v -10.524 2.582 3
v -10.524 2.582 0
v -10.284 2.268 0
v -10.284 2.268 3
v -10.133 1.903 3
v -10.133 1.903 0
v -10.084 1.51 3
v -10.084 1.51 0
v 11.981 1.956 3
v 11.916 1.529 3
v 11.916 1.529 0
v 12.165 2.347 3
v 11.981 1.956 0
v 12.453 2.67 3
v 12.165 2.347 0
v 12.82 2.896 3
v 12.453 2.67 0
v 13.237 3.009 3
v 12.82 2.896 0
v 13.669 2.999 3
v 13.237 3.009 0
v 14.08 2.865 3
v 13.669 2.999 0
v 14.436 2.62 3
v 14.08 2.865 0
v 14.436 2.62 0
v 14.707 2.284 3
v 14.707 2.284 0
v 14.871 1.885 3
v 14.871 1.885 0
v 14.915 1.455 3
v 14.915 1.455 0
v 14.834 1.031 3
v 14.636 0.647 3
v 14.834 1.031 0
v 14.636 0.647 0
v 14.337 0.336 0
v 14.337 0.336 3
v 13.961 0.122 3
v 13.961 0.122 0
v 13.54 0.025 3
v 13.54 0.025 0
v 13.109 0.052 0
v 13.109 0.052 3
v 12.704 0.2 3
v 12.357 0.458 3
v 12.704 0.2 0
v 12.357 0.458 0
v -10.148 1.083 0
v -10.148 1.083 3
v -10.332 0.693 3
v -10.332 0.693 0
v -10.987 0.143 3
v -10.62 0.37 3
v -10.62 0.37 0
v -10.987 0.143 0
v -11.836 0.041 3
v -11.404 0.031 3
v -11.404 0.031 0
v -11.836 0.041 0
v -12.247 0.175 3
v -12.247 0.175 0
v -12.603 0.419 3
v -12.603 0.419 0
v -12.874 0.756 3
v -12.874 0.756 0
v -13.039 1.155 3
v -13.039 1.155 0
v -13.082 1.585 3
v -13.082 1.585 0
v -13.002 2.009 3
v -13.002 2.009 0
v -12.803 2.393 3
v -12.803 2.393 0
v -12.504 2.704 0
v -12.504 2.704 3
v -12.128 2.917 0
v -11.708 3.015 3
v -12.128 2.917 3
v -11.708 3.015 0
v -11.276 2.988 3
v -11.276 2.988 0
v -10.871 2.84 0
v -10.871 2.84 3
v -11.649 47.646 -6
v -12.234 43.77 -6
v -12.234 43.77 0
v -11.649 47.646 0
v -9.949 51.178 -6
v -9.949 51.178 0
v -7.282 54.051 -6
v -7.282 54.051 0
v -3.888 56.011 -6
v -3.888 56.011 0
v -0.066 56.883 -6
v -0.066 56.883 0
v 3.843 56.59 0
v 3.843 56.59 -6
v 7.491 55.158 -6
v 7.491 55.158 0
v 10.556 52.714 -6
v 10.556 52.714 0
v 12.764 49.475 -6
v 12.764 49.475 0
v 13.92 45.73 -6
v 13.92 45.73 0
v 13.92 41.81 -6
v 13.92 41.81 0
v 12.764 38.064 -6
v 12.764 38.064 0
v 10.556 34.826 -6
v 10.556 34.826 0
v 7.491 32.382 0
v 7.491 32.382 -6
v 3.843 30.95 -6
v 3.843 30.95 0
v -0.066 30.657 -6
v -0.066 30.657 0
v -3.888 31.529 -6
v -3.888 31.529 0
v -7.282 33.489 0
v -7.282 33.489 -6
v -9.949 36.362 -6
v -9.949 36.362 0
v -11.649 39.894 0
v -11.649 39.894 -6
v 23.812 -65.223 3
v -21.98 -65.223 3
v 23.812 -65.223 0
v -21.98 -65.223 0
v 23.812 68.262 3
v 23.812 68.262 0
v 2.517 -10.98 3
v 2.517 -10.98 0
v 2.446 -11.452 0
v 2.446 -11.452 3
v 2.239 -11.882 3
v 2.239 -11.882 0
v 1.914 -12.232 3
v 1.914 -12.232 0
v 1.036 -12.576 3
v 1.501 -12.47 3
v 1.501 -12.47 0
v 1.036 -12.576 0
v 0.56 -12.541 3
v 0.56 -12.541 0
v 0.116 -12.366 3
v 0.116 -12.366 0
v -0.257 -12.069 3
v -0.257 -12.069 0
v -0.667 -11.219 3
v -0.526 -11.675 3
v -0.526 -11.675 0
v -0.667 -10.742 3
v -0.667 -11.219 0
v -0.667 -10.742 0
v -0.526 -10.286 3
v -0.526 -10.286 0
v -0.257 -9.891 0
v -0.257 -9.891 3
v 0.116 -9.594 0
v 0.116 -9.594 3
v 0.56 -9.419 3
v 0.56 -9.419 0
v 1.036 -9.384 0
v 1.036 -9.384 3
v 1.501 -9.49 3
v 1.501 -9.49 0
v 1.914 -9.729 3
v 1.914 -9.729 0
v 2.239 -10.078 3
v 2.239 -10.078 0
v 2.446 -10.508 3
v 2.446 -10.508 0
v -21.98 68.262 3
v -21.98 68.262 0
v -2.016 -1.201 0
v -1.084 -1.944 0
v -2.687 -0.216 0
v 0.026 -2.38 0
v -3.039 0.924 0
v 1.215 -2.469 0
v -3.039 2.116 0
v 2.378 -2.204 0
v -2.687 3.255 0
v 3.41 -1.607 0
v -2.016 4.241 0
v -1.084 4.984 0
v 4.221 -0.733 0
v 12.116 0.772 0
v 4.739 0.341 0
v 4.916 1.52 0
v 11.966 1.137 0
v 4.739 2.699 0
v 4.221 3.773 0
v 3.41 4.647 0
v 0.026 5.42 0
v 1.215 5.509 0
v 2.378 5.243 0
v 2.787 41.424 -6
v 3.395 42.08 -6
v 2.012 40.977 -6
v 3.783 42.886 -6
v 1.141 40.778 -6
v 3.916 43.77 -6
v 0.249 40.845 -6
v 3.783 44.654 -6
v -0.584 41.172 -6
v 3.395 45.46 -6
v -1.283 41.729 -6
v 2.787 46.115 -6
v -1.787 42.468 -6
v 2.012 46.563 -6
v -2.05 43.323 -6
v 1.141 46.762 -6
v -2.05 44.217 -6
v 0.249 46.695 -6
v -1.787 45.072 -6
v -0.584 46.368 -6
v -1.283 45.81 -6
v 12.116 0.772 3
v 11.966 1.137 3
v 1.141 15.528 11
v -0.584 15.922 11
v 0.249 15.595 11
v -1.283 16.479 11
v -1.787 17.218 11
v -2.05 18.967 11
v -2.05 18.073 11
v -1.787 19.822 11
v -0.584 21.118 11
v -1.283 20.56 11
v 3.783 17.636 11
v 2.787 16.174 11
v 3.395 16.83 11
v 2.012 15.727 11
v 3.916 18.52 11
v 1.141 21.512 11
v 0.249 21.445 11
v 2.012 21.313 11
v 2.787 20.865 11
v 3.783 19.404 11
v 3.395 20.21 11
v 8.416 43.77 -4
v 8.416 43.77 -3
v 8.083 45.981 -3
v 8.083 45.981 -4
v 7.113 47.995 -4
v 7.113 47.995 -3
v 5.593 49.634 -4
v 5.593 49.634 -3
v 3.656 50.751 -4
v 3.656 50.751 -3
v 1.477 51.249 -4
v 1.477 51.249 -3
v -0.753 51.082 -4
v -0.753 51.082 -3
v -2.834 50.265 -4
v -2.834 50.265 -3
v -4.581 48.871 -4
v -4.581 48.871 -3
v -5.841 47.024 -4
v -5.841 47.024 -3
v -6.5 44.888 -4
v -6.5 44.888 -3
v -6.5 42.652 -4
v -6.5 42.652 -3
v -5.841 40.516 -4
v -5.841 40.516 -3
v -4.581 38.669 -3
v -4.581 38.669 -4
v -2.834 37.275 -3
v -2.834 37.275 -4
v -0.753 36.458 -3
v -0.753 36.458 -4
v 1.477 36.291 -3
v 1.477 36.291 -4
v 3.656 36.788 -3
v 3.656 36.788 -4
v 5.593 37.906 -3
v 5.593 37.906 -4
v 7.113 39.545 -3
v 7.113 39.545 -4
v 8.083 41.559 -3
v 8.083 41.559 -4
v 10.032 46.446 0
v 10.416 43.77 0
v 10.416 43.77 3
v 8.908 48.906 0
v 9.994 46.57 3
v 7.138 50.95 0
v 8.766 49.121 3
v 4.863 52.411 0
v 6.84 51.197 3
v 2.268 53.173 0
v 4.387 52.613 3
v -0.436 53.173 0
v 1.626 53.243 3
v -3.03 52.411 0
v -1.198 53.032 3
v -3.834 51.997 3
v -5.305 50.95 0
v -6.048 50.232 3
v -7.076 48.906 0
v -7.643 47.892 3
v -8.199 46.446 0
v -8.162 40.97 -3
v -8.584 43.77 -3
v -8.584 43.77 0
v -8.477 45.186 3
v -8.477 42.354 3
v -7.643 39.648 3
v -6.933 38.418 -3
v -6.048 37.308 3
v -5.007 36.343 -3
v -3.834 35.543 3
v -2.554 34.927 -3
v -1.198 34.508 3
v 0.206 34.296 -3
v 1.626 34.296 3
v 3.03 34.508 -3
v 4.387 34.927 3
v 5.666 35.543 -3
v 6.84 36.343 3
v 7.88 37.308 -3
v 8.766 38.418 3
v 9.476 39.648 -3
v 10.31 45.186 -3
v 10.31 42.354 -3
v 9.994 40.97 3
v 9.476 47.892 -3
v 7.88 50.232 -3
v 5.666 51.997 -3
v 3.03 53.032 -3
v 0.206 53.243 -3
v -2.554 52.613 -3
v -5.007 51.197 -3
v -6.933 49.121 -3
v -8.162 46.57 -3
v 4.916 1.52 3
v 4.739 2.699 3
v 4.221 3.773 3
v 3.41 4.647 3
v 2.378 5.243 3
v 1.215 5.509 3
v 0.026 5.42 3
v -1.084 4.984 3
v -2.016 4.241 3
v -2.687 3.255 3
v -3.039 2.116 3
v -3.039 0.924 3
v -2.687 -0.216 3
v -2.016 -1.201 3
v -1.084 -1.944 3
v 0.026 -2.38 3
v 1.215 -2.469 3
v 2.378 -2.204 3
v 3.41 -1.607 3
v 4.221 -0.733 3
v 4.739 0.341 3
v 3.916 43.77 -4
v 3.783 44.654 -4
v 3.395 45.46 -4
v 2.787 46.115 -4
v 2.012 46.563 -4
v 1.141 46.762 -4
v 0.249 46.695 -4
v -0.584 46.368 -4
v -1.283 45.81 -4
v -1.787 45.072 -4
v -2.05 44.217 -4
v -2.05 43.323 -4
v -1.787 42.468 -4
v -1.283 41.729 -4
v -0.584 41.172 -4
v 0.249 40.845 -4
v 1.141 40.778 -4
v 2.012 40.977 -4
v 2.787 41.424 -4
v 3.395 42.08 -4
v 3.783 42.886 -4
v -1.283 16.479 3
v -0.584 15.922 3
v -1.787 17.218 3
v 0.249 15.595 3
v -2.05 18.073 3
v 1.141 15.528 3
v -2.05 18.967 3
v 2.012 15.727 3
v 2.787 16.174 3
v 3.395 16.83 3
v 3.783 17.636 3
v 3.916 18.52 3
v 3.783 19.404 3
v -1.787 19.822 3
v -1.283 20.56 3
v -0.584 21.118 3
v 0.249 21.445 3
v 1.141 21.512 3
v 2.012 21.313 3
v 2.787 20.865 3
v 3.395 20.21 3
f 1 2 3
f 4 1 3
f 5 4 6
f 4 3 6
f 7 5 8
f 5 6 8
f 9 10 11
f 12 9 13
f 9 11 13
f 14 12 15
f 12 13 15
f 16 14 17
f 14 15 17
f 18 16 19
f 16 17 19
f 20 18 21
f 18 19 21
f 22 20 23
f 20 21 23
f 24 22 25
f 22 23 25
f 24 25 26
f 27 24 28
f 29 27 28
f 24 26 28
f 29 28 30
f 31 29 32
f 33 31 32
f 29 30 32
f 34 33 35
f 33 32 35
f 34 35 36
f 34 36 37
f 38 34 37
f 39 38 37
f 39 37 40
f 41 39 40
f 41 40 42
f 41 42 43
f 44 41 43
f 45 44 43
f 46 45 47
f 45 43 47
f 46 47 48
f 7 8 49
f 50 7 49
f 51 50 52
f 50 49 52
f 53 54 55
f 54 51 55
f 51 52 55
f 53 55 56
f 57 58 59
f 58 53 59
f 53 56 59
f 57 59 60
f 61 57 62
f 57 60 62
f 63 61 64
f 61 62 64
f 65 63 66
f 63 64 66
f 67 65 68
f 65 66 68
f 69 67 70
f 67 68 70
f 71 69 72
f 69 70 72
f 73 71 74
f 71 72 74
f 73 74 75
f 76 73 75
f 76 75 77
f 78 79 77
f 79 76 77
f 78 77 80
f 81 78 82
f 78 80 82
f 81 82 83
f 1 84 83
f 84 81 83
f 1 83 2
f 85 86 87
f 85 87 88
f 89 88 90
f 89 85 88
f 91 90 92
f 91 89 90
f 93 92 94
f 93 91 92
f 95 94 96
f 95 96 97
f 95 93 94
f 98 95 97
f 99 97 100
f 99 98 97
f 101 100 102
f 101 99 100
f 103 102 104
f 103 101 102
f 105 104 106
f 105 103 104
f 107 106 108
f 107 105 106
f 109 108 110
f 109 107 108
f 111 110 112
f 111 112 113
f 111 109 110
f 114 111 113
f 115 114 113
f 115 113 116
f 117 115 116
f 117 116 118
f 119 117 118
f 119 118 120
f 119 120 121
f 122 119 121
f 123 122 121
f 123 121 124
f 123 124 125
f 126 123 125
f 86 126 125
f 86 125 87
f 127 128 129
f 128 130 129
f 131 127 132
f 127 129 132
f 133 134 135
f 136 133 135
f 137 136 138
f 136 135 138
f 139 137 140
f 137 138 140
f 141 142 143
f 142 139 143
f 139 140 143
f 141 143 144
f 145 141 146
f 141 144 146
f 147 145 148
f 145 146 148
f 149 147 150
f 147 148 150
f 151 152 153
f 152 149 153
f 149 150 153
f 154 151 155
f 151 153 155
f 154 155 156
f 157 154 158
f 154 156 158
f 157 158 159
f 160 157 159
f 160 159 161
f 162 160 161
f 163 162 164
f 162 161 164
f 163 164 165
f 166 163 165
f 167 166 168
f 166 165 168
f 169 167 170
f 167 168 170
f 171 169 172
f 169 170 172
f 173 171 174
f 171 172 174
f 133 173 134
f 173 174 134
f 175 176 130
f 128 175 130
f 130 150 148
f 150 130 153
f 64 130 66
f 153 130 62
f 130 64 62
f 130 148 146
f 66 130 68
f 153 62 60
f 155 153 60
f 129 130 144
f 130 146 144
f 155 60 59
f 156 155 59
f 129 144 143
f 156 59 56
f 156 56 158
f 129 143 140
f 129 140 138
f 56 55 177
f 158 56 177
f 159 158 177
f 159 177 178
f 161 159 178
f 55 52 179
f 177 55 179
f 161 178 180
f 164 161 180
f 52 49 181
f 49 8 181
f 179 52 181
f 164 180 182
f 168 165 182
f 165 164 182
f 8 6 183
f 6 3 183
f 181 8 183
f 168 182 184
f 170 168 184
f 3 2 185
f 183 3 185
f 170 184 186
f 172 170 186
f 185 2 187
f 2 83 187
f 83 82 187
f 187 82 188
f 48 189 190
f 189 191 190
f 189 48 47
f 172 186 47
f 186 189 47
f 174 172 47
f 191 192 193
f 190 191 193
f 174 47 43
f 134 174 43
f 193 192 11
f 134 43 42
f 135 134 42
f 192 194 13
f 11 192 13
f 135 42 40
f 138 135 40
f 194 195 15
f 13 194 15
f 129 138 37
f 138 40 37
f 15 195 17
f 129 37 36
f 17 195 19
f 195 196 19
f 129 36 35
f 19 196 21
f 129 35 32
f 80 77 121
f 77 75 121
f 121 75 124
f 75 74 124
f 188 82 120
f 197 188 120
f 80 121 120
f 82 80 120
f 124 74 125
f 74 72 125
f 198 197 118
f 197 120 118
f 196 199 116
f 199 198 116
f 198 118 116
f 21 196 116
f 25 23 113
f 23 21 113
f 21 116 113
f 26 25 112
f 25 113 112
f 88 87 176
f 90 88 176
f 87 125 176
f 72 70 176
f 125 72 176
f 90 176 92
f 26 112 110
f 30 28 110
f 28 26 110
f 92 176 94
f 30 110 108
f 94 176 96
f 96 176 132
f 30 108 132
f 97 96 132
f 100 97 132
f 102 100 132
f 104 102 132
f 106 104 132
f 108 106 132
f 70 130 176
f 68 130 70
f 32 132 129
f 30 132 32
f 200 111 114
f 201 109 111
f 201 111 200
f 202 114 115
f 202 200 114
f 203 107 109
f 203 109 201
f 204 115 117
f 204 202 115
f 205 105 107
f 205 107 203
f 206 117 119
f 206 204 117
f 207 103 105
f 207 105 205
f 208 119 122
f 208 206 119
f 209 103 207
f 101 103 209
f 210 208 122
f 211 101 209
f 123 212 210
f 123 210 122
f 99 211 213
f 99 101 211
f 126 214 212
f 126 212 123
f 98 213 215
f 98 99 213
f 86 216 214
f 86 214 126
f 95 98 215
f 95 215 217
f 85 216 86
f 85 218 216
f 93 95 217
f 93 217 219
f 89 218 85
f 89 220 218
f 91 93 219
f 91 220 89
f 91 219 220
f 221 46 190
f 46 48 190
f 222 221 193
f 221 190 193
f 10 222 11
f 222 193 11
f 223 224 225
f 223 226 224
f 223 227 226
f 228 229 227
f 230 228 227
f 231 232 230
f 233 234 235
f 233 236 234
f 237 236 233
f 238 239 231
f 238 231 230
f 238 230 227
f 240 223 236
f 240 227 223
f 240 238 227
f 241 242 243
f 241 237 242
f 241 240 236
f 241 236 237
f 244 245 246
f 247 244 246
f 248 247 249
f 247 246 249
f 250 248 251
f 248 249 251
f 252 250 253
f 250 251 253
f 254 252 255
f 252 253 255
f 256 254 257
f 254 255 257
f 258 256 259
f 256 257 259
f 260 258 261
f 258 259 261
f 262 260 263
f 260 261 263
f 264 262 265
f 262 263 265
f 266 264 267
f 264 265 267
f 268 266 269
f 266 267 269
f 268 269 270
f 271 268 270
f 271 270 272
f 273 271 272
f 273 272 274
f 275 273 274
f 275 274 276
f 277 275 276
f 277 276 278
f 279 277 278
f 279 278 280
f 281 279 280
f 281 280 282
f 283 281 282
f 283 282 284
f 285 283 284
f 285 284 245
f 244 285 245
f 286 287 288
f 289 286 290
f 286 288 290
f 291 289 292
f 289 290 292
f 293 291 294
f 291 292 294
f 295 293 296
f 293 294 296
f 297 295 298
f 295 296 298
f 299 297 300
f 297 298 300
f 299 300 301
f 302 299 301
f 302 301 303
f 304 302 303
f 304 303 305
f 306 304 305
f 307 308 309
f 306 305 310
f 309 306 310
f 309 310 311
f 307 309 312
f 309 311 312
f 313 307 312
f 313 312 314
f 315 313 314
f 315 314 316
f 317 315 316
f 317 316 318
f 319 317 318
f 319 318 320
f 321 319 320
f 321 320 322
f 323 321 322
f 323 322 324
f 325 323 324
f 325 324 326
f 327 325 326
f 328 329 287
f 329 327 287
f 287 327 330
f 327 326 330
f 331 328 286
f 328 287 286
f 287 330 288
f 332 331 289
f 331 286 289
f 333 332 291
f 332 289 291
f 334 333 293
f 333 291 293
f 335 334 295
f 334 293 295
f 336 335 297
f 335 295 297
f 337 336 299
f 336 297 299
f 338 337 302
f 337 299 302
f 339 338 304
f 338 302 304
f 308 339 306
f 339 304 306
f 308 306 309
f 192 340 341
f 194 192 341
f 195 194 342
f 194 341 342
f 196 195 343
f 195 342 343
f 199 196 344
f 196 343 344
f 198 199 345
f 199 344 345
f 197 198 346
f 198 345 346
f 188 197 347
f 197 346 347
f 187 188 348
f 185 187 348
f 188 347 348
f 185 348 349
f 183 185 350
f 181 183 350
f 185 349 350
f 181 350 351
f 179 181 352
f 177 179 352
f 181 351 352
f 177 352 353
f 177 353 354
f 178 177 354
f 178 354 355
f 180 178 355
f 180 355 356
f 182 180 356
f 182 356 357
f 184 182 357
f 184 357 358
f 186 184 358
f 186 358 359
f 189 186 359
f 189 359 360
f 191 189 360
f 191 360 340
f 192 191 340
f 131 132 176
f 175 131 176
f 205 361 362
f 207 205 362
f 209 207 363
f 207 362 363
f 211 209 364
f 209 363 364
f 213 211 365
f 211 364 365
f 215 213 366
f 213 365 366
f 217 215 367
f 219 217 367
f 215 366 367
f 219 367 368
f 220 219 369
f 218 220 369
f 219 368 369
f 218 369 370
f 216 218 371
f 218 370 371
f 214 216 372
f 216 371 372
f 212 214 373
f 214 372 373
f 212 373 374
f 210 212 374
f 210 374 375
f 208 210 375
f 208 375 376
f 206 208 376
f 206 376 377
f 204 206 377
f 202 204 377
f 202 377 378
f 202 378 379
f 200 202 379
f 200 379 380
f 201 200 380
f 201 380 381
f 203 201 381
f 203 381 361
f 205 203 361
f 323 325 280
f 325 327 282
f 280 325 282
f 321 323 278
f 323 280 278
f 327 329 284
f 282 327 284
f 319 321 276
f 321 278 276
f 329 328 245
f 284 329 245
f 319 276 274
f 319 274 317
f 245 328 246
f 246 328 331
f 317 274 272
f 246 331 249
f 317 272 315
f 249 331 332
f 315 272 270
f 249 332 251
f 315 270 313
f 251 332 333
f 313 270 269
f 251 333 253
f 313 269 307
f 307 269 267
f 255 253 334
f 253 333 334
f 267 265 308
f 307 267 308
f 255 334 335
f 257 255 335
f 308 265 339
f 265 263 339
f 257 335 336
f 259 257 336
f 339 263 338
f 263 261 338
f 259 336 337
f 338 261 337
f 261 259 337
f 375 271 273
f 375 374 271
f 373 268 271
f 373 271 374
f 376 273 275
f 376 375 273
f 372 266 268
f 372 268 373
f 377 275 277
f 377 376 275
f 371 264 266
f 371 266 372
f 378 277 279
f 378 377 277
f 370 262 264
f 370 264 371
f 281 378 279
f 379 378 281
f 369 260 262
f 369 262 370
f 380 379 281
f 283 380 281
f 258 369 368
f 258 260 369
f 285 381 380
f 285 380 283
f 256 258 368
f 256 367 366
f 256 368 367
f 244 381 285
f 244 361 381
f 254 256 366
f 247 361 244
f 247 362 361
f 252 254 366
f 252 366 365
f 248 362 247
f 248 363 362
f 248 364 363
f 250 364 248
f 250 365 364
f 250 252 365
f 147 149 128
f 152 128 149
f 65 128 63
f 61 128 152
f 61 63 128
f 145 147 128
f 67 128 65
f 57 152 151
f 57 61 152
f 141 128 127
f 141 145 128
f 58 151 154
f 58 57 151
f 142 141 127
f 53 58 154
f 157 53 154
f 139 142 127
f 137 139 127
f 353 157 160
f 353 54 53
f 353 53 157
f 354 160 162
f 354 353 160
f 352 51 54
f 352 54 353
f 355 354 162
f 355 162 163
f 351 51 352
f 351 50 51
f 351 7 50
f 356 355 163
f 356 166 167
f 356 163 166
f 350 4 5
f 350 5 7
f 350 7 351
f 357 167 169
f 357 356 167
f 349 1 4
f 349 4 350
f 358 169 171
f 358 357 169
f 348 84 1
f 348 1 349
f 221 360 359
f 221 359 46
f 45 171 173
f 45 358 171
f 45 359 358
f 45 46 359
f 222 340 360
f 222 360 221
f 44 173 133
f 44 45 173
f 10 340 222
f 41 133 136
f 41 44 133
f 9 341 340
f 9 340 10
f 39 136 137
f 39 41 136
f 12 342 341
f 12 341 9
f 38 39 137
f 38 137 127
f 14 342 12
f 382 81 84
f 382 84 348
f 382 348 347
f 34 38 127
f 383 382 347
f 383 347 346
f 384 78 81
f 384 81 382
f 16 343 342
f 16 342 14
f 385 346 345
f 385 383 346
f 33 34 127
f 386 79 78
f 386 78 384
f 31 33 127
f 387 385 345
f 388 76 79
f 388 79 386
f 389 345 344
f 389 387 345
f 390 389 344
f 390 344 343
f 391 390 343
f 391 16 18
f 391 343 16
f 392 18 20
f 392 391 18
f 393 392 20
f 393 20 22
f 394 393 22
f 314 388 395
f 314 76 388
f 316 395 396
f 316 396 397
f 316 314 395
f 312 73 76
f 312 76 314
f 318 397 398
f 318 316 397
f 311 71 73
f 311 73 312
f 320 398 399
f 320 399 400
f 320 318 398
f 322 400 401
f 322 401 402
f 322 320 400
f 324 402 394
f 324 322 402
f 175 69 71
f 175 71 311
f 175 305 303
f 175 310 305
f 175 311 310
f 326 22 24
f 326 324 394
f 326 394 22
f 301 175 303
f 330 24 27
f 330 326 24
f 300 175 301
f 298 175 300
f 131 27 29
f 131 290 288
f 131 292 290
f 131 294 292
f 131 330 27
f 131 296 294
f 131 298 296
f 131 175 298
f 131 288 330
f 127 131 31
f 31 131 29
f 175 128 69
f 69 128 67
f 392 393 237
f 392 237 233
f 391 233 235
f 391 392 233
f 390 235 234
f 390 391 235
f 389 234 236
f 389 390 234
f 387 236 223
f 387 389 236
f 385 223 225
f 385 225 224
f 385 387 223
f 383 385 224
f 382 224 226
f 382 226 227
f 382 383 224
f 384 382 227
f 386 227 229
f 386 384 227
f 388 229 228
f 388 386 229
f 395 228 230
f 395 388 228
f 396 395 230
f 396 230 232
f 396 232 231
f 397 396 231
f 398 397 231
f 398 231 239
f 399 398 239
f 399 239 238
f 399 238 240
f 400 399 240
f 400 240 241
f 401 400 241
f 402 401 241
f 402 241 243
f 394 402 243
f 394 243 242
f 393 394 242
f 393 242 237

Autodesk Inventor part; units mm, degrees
ref_plane "YZ Plane" through (0, 0, 0) normal (1, 0, 0) x (0, 1, 0)
ref_plane "XZ Plane" through (0, 0, 0) normal (0, 1, 0) x (-1, 0, 0)
ref_plane "XY Plane" through (0, 0, 0) normal (0, 0, 1) x (1, 0, 0)
sketch "Эскиз1" plane through (0, 0, 0) normal (0, 0, 1) x (1, 0, 0)
  circle A0 centre (0.9164, -10.9801) radius 1.6008
  arc A1 (-10.5243, 2.5819) -> (-10.0836, 1.5104) centre (-11.5836, 1.5199) ccw
  arc A2 (12.3571, 0.4579) -> (11.9164, 1.5294) centre (13.4164, 1.5199) ccw
  circle A3 centre (-11.5836, 1.5199) radius 1.5
  circle A4 centre (13.4164, 1.5199) radius 1.5
  line L0 (-21.9797, -65.2227) -> (23.8125, -65.2227)
  line L1 (23.8125, -65.2227) -> (23.8125, 68.2625)
  line L2 (23.8125, 68.2625) -> (-21.9797, 68.2625)
  line L3 (-21.9797, 68.2625) -> (-21.9797, -65.2227)
  line L4 (-21.9797, -65.2227) -> (23.8125, 68.2625) construction
  line L5 (23.8125, -65.2227) -> (-21.9797, 68.2625) construction
  point P0 (0, 0)
  point P1 (-10.0836, 1.5104)
  point P2 (12.3571, 0.4579)
  point P3 (11.9164, 1.5294)
extrude "Выдавливание1" add sketch "Эскиз1" along normal blind 3
sketch "Эскиз2" plane through (0, 0, 3) normal (0, 0, 1) x (1, 0, 0)
  line L0 (23.8125, -65.2227) -> (23.8125, 68.2625) projected
  line L1 (23.8125, 68.2625) -> (-21.9797, 68.2625) projected
  line L2 (-21.9797, 68.2625) -> (-21.9797, -65.2227) projected
  line L3 (-21.9797, -65.2227) -> (23.8125, -65.2227) projected
  circle A0 centre (-11.5836, 1.5199) radius 1.5 projected
  circle A1 centre (13.4164, 1.5199) radius 1.5 projected
  circle A2 centre (0.9164, -10.9801) radius 1.6008 projected
  line L4 (-11.5836, 1.5199) -> (13.4164, 1.5199)
  line L5 (0.9164, 14.0199) -> (0.9164, -10.9801)
  circle A3 centre (0.9164, 1.5199) radius 4
  point P0 (0, 0)
  dimension "d2" = 8
extrude "Выдавливание2" cut sketch "Эскиз2" against normal blind 3 contours A3 L5 L4 | L4 L5 A3 | L5 A3 L4 | L4 A3 L5
sketch "Эскиз3" plane through (0, 0, 3) normal (0, 0, 1) x (1, 0, 0)
  circle A0 centre (0.9164, 1.5199) radius 4 projected
  line L0 (23.8125, -65.2227) -> (23.8125, 68.2625) projected
  line L1 (23.8125, 68.2625) -> (-21.9797, 68.2625) projected
  line L2 (-21.9797, 68.2625) -> (-21.9797, -65.2227) projected
  line L3 (-21.9797, -65.2227) -> (23.8125, -65.2227) projected
  circle A1 centre (-11.5836, 1.5199) radius 1.5 projected
  circle A2 centre (13.4164, 1.5199) radius 1.5 projected
  circle A3 centre (0.9164, -10.9801) radius 1.6008 projected
  line L4 (0.9164, 1.5199) -> (0.9164, 18.5199)
  circle A4 centre (0.9164, 18.5199) radius 3
  point P0 (0, 0)
  dimension "d5" = 17
  dimension "d6" = 6
extrude "Выдавливание3" add sketch "Эскиз3" along normal blind 8 contours A4
sketch "Эскиз4" plane through (0, 0, 3) normal (0, 0, 1) x (1, 0, 0)
  circle A0 centre (0.9164, 18.5199) radius 3 projected
  circle A1 centre (0.9164, 43.7699) radius 9.5
  circle A2 centre (0.9164, 43.7699) radius 13.15
  circle A3 centre (0.9164, 18.5199) radius 3 projected
  circle A4 centre (0.9164, 1.5199) radius 4 projected
  line L0 (23.8125, -65.2227) -> (23.8125, 68.2625) projected
  line L1 (23.8125, 68.2625) -> (-21.9797, 68.2625) projected
  line L2 (-21.9797, 68.2625) -> (-21.9797, -65.2227) projected
  line L3 (-21.9797, -65.2227) -> (23.8125, -65.2227) projected
  circle A5 centre (-11.5836, 1.5199) radius 1.5 projected
  circle A6 centre (13.4164, 1.5199) radius 1.5 projected
  circle A7 centre (0.9164, -10.9801) radius 1.6008 projected
  point P0 (0, 0)
  dimension "d17" = 42.25
  dimension "d18" = 0
extrude "Выдавливание4" add sketch "Эскиз4" along normal blind 6 contours A2
sketch "Эскиз5" plane through (0, 0, 3) normal (0, 0, 1) x (1, 0, 0)
  circle A0 centre (0.9164, -10.9801) radius 1.6008 projected
  circle A1 centre (13.4164, 1.5199) radius 1.5 projected
  circle A2 centre (-11.5836, 1.5199) radius 1.5 projected
  line L0 (23.8125, -65.2227) -> (23.8125, 68.2625) projected
  line L1 (23.8125, 68.2625) -> (-21.9797, 68.2625) projected
  line L2 (-21.9797, 68.2625) -> (-21.9797, -65.2227) projected
  line L3 (-21.9797, -65.2227) -> (23.8125, -65.2227) projected
  circle A3 centre (0.9164, 43.7699) radius 13.15 projected
  circle A4 centre (0.9164, 1.5199) radius 4 projected
  circle A5 centre (0.9164, 43.7699) radius 3
  point P0 (0, 0)
  dimension "d12" = 6
  dimension "d16" = 0
extrude "Выдавливание5" cut sketch "Эскиз5" against normal blind 8 contours A5
sketch "Эскиз6" plane through (0.9164, 43.7699, 3) normal (0, 0, 1) x (1, 0, 0)
  circle A0 centre (0, 0) radius 7.5
  circle A1 centre (0, 0) radius 13.15 projected
  circle A2 centre (0, 0) radius 9.5 projected
  point P0 (-0.9164, -43.7699)
  dimension "d19" = 15
extrude "Выдавливание6" cut sketch "Эскиз6" against normal blind 1 contours A0
ref_plane "РабПлоскость1" through (0, 0, -6) normal (0, 0, -1) x (-1, 0, 0)
sketch "Эскиз7" plane through (0, 0, -6) normal (0, 0, -1) x (-1, 0, 0)
  circle A0 centre (-0.9164, 43.7699) radius 13.15 projected
  circle A1 centre (-0.9164, 43.7699) radius 9.5 projected
  point P0 (0, 0)
extrude "Выдавливание7" add sketch "Эскиз7" against normal blind 6
sketch "Эскиз8" plane through (0.9164, 43.7699, 9) normal (0, 0, 1) x (1, 0, 0)
  circle A0 centre (0, 0) radius 13.15 projected
  circle A1 centre (0, 0) radius 9.5 projected
  point P0 (-0.9164, -43.7699)
extrude "Выдавливание8" cut sketch "Эскиз8" against normal blind 6
sketch "Эскиз9" plane through (0.9164, 43.7699, -6) normal (0, 0, -1) x (-1, 0, 0)
  circle A0 centre (0, 0) radius 13.15 projected
  point P0 (0.9164, -43.7699)
extrude "Выдавливание9" add sketch "Эскиз9" against normal blind 3
sketch "Эскиз10" plane through (0.9164, 43.7699, -3) normal (0, 0, 1) x (1, 0, 0)
  circle A0 centre (0, 0) radius 3 projected
  circle A1 centre (0, 0) radius 7.5 projected
  point P0 (-0.9164, -43.7699)
extrude "Выдавливание10" cut sketch "Эскиз10" against normal blind 1
sketch "Эскиз12" plane through (0, 0, 3) normal (0, 0, 1) x (1, 0, 0)
  circle A0 centre (0.9164, 18.5199) radius 3 projected
  circle A1 centre (0.9164, 1.5199) radius 4 projected
  line L0 (23.8125, -65.2227) -> (23.8125, 68.2625) projected
  line L1 (23.8125, 68.2625) -> (-21.9797, 68.2625) projected
  line L2 (-21.9797, 68.2625) -> (-21.9797, -65.2227) projected
  line L3 (-21.9797, -65.2227) -> (23.8125, -65.2227) projected
  circle A2 centre (-11.5836, 1.5199) radius 1.5 projected
  circle A3 centre (13.4164, 1.5199) radius 1.5 projected
  circle A4 centre (0.9164, -10.9801) radius 1.6008 projected
  circle A5 centre (0.9164, 43.7699) radius 7.5 projected
  circle A6 centre (0.9164, 43.7699) radius 9.5
  point P0 (0, 0)
  dimension "d33" = 19
extrude "Выдавливание12" cut sketch "Эскиз12" against normal blind 6 contours A5 | A6
sketch "Эскиз13" plane through (0.9164, 43.7699, -3) normal (0, 0, 1) x (1, 0, 0)
  circle A0 centre (0, 0) radius 3 projected
  point P0 (-0.9164, -43.7699)
extrude "Выдавливание13" cut sketch "Эскиз13" against normal through all
properties part number "пластина для редуктора"
